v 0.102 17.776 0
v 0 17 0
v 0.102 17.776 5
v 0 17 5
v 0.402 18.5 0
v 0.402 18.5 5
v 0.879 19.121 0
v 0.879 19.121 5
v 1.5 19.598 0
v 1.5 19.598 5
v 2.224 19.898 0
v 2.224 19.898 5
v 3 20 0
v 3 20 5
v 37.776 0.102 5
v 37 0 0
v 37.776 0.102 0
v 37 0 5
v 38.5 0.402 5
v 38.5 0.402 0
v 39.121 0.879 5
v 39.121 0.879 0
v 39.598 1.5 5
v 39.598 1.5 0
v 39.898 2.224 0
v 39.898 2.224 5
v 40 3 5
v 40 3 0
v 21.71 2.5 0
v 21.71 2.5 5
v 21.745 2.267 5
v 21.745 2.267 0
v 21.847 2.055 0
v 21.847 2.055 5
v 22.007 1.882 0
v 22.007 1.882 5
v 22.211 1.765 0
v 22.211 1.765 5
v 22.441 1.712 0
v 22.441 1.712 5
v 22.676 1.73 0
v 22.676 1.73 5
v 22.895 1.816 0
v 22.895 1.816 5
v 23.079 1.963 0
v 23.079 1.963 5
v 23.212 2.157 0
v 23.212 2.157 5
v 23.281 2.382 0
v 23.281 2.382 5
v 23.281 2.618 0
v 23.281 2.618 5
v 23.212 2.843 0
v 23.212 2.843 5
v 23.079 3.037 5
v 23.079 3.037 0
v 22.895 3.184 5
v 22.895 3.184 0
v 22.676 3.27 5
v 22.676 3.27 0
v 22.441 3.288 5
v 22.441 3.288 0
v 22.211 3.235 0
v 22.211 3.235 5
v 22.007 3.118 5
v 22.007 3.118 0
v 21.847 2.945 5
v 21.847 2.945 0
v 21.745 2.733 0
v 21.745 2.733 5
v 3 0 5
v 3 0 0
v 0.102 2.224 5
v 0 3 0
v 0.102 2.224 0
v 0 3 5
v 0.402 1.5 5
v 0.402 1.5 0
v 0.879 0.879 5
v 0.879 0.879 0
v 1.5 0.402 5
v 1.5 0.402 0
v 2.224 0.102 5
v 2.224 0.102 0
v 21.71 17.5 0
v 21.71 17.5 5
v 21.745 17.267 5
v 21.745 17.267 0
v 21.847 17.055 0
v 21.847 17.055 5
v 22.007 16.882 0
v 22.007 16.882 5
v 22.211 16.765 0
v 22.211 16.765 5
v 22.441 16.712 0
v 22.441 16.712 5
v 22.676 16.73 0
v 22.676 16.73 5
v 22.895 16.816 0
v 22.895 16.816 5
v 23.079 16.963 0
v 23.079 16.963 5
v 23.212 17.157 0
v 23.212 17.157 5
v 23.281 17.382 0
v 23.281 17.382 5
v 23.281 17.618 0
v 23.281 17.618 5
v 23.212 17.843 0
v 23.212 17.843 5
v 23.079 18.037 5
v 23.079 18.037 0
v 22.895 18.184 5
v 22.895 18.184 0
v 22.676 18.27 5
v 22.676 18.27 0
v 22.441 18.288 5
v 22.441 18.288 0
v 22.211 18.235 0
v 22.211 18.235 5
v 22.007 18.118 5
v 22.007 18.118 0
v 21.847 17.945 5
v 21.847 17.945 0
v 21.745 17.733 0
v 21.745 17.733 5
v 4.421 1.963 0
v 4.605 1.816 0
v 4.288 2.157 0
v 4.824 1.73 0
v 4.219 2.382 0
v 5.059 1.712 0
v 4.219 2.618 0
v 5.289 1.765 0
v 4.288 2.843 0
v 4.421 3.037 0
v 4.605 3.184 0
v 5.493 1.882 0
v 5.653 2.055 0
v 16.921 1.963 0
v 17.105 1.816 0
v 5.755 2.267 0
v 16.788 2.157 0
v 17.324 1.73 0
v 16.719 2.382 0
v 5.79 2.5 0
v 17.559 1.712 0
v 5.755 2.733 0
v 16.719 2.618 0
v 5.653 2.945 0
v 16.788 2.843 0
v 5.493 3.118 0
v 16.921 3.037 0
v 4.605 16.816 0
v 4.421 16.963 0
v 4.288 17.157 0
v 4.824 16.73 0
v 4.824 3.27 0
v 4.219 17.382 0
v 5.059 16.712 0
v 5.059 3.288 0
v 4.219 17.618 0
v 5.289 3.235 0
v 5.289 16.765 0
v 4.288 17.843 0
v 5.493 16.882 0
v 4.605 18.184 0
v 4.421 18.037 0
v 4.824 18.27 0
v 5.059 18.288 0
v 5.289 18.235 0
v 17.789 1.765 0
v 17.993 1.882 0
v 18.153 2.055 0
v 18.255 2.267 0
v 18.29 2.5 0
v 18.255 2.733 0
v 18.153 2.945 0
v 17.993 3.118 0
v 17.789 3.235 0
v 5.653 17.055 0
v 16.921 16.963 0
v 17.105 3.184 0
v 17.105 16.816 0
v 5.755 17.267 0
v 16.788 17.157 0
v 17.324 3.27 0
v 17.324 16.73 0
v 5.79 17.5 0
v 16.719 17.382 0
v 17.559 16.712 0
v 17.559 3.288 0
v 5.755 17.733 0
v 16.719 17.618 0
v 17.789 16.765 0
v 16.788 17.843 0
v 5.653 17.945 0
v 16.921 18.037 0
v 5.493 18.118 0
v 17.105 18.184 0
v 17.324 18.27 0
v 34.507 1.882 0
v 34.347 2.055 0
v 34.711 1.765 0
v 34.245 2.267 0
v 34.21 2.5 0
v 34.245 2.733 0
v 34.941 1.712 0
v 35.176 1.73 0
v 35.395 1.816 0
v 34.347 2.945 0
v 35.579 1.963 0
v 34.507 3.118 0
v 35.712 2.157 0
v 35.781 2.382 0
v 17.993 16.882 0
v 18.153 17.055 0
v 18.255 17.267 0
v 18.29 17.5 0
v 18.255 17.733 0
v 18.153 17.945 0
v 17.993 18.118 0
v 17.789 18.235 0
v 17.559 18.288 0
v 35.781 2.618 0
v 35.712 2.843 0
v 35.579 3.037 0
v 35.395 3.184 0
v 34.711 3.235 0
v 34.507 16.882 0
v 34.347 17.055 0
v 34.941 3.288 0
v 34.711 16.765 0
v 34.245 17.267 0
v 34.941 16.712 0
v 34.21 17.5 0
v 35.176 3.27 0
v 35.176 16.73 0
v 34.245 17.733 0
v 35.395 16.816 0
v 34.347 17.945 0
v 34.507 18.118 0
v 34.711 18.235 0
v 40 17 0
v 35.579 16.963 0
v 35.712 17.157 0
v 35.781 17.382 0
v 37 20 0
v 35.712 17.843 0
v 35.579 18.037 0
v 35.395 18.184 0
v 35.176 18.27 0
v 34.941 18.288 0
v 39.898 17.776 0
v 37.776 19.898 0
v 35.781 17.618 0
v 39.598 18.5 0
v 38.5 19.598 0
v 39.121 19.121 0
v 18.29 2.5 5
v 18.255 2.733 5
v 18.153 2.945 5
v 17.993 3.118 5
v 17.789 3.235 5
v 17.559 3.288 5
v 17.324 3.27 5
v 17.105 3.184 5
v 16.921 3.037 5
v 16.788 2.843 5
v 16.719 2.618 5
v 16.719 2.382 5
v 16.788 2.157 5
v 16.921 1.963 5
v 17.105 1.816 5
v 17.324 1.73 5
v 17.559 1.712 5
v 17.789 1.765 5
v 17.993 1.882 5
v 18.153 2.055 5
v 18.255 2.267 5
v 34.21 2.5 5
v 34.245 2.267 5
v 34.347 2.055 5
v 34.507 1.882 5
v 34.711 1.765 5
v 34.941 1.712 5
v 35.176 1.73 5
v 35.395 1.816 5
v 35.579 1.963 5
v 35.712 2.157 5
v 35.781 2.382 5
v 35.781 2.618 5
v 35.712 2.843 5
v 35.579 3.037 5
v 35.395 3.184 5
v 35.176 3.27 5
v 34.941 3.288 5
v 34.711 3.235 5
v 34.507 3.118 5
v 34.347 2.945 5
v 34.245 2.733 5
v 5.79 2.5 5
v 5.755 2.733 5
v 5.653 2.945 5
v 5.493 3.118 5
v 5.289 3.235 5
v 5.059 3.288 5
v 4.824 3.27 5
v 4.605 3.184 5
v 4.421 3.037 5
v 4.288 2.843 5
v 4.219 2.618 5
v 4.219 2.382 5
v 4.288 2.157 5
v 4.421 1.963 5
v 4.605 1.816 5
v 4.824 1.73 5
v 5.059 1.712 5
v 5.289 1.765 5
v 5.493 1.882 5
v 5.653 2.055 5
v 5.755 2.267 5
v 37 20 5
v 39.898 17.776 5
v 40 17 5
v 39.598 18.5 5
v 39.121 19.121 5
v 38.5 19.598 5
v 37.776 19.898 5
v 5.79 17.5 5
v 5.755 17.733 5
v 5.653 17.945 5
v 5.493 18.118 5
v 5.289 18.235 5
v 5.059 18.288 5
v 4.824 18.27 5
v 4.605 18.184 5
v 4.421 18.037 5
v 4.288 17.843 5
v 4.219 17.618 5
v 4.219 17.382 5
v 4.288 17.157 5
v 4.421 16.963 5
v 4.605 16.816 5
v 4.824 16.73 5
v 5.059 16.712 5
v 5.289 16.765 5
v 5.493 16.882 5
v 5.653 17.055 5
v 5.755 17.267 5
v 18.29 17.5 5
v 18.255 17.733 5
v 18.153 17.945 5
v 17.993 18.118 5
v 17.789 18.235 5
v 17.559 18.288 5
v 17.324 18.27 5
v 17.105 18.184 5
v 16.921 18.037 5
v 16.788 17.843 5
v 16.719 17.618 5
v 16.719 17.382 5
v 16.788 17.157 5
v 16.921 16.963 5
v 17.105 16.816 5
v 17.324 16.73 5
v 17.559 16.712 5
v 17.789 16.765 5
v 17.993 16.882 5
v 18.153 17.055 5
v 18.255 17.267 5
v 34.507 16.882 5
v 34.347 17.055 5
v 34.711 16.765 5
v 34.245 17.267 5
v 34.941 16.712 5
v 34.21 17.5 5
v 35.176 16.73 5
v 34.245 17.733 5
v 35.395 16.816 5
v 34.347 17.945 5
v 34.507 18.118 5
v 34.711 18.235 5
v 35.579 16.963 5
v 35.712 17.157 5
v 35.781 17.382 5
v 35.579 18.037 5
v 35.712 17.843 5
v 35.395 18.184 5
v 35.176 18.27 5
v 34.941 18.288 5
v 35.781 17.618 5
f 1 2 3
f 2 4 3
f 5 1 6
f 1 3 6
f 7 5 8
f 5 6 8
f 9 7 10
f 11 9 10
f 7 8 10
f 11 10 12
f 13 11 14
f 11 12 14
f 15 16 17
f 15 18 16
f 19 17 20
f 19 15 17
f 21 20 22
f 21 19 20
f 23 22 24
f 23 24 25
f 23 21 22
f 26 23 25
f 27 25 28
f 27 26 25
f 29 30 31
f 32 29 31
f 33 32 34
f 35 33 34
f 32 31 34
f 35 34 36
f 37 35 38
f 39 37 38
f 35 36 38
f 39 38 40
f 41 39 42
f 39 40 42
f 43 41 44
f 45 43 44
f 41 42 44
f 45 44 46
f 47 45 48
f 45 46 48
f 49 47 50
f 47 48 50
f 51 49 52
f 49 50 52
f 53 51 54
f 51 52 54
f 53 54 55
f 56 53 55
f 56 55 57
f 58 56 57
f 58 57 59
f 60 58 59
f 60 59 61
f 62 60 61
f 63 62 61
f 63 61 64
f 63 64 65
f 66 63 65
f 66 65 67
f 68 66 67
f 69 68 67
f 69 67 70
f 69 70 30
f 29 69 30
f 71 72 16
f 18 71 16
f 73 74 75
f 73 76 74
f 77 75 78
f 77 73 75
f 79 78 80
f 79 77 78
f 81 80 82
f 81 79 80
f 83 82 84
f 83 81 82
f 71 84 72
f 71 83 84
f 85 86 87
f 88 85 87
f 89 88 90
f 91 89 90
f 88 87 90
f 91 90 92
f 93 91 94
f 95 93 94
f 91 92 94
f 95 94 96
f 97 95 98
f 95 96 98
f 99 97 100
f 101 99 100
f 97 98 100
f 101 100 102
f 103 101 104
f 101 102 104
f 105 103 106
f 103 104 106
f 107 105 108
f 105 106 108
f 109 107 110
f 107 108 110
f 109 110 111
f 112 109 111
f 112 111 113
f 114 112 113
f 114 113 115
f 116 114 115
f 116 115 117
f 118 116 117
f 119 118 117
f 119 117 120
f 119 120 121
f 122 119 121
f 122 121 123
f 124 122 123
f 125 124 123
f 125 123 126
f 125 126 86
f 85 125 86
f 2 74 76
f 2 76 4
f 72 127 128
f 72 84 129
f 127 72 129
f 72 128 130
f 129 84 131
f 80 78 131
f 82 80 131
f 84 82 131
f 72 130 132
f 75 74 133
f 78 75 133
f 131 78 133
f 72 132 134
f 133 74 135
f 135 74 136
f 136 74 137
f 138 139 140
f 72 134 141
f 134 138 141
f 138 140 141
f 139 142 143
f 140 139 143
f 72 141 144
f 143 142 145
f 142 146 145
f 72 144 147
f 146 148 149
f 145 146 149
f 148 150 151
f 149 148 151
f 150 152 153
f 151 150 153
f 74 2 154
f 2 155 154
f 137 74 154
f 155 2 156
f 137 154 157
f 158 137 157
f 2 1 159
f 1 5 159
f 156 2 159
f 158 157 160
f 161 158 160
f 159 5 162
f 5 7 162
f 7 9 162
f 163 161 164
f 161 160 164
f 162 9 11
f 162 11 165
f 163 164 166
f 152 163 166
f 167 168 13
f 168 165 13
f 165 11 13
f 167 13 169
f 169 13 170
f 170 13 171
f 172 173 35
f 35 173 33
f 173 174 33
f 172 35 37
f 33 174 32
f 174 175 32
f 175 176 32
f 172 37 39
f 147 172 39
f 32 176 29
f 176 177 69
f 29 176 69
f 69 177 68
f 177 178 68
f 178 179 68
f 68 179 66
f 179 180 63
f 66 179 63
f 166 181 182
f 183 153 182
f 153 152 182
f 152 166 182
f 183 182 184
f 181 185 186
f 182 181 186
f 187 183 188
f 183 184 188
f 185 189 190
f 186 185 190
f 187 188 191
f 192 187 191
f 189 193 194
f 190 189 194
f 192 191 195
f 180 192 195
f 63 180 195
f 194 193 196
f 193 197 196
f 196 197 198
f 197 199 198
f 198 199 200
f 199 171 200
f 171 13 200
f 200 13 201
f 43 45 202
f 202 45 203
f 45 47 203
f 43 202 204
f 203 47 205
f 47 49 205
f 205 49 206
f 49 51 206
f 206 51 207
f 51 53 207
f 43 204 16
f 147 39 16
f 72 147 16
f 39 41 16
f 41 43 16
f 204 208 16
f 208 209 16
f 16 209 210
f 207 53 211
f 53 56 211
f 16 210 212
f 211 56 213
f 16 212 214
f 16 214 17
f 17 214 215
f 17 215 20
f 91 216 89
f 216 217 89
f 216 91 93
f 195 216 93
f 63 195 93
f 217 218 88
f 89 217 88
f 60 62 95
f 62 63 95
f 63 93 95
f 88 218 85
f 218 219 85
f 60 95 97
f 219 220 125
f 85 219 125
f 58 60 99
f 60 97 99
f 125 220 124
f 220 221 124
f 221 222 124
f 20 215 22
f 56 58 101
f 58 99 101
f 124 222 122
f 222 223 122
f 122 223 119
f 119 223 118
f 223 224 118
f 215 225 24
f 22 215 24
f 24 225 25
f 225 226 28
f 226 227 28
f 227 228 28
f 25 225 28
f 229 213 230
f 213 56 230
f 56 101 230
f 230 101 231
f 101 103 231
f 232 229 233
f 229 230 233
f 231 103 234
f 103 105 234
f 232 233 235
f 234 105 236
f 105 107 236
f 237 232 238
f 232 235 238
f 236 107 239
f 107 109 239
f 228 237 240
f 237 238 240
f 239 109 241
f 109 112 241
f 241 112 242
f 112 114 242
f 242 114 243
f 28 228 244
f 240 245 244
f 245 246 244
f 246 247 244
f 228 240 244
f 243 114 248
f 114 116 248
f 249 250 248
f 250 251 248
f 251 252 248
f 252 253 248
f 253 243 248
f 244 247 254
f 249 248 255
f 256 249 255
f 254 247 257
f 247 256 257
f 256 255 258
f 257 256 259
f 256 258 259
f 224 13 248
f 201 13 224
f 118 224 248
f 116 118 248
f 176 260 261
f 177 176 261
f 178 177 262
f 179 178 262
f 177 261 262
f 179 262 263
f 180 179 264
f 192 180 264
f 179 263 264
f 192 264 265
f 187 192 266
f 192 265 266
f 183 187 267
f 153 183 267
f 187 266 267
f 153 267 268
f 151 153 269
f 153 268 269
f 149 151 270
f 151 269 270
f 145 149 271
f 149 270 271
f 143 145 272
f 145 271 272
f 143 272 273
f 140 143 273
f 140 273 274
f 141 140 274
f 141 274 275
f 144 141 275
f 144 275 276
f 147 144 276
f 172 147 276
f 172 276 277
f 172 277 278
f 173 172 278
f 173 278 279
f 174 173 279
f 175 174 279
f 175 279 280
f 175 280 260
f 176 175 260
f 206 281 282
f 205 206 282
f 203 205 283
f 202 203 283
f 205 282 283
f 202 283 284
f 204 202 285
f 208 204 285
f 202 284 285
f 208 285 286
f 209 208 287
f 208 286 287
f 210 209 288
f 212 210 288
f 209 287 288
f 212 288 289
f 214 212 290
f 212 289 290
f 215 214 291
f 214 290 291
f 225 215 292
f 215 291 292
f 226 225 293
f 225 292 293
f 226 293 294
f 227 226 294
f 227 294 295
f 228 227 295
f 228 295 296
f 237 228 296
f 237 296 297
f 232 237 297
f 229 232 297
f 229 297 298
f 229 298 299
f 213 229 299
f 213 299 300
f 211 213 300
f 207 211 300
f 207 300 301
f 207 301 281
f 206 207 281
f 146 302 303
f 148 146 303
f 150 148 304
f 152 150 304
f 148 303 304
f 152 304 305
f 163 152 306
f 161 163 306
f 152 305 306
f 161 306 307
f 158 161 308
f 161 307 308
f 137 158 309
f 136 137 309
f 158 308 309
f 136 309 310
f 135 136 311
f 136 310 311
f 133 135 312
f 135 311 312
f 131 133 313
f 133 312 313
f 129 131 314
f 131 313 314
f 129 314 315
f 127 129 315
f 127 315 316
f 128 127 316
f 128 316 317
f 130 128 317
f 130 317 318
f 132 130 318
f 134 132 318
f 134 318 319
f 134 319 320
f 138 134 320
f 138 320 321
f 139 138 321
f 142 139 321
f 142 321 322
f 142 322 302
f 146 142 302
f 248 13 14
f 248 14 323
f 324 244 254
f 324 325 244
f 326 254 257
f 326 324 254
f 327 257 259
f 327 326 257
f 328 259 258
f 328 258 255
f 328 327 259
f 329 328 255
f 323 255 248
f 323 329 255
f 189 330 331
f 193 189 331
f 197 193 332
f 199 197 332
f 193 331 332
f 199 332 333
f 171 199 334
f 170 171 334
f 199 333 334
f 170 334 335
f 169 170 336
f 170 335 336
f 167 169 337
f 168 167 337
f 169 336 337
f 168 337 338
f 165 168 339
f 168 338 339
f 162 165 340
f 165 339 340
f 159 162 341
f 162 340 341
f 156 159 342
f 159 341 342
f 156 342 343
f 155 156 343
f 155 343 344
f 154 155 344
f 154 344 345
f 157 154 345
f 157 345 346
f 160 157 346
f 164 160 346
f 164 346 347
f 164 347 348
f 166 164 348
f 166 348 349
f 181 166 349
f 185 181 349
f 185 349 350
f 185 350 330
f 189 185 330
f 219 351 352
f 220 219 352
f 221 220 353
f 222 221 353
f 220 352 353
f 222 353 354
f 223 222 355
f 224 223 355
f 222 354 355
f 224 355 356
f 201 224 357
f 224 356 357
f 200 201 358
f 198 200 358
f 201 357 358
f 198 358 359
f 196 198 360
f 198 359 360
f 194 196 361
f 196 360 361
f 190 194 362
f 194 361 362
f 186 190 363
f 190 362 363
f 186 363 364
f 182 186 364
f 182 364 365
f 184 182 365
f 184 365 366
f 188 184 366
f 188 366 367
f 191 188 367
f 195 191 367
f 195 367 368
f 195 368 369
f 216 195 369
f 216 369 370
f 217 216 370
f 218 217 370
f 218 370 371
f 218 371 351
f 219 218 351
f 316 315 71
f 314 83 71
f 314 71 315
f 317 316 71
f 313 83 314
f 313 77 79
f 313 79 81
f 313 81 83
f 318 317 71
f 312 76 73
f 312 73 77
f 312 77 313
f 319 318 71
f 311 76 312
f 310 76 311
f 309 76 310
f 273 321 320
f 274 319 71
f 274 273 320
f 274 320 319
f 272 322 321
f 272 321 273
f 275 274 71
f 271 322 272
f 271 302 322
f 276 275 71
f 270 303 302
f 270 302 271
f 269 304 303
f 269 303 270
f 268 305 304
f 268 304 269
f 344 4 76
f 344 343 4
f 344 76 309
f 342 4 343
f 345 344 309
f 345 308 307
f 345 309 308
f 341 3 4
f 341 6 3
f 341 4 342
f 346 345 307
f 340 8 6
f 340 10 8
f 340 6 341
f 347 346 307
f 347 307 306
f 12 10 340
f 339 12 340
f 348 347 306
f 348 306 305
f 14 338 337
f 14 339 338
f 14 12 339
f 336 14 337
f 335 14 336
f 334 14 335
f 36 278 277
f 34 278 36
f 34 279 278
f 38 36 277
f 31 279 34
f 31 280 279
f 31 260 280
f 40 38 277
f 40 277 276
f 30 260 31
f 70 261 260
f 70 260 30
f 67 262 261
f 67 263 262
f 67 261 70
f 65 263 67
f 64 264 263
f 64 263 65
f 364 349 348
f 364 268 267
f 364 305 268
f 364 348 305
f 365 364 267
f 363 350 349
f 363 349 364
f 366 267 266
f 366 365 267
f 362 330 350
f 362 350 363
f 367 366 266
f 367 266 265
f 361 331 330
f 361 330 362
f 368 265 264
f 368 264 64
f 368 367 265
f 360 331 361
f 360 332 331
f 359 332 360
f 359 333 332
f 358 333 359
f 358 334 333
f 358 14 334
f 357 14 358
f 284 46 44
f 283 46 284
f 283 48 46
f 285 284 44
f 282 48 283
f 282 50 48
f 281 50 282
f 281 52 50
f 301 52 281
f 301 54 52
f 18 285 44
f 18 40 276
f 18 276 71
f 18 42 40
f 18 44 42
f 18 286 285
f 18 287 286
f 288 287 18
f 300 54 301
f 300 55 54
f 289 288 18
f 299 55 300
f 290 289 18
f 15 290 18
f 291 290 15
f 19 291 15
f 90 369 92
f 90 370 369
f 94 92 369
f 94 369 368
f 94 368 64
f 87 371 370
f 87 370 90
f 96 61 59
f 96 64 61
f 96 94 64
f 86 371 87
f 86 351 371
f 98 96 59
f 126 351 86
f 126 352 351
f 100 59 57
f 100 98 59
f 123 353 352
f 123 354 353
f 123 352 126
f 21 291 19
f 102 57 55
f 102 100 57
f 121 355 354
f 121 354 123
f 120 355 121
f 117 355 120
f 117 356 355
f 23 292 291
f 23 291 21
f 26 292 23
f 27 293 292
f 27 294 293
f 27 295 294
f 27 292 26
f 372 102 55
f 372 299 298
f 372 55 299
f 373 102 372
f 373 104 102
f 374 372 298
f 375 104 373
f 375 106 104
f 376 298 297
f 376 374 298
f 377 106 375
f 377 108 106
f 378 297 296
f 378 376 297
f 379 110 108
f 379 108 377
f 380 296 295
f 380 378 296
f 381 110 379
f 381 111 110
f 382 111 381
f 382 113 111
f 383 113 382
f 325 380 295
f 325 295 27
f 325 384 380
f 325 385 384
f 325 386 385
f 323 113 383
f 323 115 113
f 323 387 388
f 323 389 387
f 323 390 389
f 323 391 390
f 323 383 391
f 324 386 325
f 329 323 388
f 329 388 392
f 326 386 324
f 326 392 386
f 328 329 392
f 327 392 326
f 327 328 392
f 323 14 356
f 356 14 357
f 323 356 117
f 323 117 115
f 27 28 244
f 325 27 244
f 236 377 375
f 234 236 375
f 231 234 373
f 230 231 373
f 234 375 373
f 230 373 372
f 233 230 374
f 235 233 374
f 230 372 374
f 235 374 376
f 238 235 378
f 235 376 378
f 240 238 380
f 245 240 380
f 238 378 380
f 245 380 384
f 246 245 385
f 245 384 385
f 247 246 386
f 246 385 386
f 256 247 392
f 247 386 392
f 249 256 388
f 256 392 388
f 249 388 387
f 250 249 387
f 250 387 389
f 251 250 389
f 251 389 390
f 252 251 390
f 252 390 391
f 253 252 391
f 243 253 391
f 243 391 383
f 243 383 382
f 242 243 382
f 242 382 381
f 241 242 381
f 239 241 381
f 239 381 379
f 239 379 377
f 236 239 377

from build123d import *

# Parameters (mm, degrees)
ESQUISSE1_W             = 40
ESQUISSE1_H             = 20
BOSS_EXTRU_1_DEPTH      = 5
CONG_1_R                = 3
ESQUISSE2_R             = 0.79
ENL_V_MAT_EXTRU_1_DEPTH = 46


with BuildPart() as part:
    # Esquisse1 → Boss.-Extru.1 (new body)
    with BuildSketch(Plane.XY):
        with Locations((20, 10)):
            Rectangle(ESQUISSE1_W, ESQUISSE1_H)
    extrude(amount=BOSS_EXTRU_1_DEPTH)

    # Congé1
    cong_1_edges = [part.edges().sort_by_distance(p)[0] for p in [
        (0, 20, 2.5),
        (40, 20, 2.5),
        (40, 0, 2.5),
        (0, 0, 2.5),
    ]]
    fillet(cong_1_edges, radius=CONG_1_R)

    # Esquisse2 → Enlèv. mat.-Extru.1 (cut, through all)
    with BuildSketch(Plane.XY.offset(5)):
        with Locations((5, 17.5)):
            Circle(ESQUISSE2_R)
        with Locations((5, 2.5)):
            Circle(ESQUISSE2_R)
        with Locations((17.5, 2.5)):
            Circle(ESQUISSE2_R)
        with Locations((17.5, 17.5)):
            Circle(ESQUISSE2_R)
        with Locations(Location((22.5, 17.5, 0), (0, 0, 180))):
            Circle(ESQUISSE2_R)
        with Locations(Location((22.5, 2.5, 0), (0, 0, 180))):
            Circle(ESQUISSE2_R)
        with Locations(Location((35, 2.5, 0), (0, 0, 180))):
            Circle(ESQUISSE2_R)
        with Locations(Location((35, 17.5, 0), (0, 0, 180))):
            Circle(ESQUISSE2_R)
    extrude(amount=-ENL_V_MAT_EXTRU_1_DEPTH, mode=Mode.SUBTRACT)


solid = part.part
